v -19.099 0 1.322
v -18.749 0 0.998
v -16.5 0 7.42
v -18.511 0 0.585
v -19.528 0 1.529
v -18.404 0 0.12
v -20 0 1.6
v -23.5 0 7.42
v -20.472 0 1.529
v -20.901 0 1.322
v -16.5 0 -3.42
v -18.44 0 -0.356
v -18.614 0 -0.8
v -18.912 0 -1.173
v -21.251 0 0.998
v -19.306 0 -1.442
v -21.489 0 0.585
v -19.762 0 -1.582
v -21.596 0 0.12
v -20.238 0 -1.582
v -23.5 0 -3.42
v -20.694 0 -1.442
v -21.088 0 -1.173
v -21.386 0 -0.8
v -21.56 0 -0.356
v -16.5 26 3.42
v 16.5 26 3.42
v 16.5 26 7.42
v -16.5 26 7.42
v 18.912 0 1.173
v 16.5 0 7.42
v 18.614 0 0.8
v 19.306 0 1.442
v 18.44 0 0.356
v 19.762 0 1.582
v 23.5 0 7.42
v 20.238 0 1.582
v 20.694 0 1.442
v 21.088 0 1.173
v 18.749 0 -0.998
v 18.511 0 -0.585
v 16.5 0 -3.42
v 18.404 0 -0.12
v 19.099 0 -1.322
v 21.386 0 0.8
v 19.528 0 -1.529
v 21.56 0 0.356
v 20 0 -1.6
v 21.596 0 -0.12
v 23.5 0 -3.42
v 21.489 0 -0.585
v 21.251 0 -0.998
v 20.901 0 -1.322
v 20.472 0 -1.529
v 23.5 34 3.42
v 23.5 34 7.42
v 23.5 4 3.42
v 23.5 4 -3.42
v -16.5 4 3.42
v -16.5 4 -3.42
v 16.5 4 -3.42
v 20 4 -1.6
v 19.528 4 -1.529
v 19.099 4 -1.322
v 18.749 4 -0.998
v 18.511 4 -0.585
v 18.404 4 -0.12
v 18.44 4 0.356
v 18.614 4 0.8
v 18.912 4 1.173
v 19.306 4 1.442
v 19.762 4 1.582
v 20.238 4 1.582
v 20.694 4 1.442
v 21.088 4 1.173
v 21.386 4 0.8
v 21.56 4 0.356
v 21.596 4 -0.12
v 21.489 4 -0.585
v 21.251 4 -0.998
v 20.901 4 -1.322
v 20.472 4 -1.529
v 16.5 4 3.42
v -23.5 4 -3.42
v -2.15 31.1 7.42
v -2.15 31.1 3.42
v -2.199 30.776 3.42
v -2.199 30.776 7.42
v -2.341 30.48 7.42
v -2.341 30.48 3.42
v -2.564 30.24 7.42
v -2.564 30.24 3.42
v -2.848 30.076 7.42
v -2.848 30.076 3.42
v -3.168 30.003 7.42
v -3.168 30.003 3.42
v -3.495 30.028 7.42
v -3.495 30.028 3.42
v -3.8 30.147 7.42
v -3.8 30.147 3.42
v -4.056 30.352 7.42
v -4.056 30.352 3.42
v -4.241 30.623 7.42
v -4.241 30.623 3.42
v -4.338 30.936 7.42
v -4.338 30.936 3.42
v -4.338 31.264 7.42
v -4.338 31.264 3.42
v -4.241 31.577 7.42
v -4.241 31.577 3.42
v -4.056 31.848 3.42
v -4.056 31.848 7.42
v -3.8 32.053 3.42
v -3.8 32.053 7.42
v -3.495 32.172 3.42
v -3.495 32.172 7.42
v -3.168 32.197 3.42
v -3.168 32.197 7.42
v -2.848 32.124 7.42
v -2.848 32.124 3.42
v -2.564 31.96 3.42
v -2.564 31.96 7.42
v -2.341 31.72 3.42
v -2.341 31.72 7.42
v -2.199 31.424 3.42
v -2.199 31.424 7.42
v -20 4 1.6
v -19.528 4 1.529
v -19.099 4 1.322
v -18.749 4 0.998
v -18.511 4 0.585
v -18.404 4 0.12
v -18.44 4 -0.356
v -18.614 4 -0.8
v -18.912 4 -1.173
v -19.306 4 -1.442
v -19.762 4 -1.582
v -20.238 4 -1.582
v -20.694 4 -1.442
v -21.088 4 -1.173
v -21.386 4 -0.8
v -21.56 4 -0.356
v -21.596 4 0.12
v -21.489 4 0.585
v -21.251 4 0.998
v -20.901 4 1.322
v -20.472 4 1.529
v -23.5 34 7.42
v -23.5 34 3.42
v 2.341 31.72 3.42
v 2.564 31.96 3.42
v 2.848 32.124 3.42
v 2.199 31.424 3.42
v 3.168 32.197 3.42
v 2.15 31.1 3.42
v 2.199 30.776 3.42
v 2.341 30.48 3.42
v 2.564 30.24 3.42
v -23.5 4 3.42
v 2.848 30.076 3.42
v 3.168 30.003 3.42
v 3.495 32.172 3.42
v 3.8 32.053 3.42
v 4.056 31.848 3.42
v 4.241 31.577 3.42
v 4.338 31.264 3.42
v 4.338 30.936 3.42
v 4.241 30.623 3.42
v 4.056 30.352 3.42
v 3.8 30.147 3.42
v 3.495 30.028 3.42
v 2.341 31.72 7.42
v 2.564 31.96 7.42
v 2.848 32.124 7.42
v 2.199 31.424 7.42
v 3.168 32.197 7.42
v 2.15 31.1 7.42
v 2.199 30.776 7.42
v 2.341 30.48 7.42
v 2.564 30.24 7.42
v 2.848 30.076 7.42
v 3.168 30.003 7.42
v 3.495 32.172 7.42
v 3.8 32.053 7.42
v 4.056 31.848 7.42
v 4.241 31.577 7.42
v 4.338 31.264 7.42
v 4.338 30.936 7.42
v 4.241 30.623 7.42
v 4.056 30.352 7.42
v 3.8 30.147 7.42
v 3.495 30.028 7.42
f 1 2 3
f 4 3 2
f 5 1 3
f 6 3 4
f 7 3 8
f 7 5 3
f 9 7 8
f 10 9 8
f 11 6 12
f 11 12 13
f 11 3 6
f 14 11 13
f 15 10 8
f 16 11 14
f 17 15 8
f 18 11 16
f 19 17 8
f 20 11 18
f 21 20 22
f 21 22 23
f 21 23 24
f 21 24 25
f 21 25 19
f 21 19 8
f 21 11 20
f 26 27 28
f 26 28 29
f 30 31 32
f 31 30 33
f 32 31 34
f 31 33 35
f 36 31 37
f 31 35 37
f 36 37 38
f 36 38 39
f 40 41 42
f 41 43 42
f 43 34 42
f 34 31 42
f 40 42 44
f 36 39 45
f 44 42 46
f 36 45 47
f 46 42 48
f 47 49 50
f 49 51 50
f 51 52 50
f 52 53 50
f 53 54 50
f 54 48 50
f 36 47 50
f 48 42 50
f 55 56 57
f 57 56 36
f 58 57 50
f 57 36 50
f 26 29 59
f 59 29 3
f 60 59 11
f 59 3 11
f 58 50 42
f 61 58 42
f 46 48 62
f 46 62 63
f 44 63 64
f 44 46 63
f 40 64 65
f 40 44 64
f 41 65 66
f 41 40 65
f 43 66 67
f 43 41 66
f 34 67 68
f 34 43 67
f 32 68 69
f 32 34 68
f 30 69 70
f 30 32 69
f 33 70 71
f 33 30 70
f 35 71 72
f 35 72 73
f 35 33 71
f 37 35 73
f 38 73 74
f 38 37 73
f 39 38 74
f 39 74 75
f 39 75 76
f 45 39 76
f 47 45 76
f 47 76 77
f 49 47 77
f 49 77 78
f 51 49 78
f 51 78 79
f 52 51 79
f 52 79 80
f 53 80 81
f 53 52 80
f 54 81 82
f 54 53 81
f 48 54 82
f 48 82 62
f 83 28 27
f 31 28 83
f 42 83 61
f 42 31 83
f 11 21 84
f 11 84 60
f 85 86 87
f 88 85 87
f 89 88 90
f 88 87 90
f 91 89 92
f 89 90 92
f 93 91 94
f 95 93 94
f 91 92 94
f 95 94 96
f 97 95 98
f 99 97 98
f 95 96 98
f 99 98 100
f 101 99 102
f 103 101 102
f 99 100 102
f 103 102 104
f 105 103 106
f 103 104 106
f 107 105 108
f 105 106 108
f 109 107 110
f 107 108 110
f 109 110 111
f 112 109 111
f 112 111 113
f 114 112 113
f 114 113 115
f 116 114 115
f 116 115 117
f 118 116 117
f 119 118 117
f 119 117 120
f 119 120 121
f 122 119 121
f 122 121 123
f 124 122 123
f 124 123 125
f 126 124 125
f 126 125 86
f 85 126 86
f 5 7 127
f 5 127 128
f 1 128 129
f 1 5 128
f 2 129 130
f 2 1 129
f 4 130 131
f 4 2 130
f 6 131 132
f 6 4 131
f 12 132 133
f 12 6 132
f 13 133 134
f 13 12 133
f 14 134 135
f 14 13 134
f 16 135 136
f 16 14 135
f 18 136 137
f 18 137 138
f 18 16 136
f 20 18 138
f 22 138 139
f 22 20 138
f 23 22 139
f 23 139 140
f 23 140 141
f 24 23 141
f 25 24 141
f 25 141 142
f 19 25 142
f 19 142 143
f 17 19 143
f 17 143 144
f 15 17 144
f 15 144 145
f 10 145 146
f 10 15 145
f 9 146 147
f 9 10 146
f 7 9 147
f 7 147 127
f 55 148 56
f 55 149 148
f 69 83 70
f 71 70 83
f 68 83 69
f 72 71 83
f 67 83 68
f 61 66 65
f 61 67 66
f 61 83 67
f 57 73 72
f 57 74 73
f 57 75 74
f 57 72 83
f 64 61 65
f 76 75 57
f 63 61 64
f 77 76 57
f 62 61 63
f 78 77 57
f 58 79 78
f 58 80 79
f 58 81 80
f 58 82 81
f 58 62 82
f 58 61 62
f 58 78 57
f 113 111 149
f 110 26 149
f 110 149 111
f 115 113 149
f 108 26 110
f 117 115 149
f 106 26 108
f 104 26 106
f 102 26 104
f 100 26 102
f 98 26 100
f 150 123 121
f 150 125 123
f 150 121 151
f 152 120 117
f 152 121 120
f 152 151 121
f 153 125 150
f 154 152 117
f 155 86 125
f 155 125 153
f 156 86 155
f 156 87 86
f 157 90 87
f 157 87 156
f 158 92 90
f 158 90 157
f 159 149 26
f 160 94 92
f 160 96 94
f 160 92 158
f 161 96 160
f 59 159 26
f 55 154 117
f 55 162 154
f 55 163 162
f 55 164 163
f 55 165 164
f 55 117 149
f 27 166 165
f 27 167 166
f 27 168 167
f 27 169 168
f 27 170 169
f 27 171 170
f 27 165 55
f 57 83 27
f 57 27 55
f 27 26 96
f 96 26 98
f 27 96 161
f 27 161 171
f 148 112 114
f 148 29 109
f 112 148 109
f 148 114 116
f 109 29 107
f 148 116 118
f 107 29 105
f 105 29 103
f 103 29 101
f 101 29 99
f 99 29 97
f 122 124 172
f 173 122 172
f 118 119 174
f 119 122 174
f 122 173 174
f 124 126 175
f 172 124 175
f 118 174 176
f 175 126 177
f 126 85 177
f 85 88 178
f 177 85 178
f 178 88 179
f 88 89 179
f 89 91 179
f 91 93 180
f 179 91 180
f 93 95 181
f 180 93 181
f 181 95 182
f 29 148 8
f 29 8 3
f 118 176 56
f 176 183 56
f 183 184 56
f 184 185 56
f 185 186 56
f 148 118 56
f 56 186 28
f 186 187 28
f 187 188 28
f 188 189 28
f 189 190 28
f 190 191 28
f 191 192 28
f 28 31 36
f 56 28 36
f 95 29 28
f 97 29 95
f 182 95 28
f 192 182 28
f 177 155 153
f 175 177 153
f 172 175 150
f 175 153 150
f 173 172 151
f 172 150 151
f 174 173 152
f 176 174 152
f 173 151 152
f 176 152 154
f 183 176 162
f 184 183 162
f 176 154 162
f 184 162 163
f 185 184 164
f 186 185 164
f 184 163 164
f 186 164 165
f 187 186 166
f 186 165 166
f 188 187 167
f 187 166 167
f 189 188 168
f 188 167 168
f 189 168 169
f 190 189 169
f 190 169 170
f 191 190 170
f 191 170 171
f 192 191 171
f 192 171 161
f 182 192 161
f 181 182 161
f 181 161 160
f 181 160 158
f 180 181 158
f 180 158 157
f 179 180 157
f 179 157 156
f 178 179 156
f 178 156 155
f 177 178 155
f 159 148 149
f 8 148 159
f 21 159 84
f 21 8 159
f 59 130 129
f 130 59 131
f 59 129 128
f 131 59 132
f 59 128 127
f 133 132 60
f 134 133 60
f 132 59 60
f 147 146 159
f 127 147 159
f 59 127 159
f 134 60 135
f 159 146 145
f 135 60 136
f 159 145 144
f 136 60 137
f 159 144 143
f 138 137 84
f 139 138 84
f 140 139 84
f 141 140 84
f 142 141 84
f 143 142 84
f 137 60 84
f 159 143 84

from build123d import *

# Parameters (mm, degrees)
SKETCH_2_R          = 1.6
EXTRUDE_1_DEPTH     = 4
EXTRUDE_1_2_DEPTH   = 4
SKETCH_3_W          = 7
SKETCH_3_H          = 4
EXTRUDE_2_DEPTH     = 30
SKETCH_4_W          = 47
SKETCH_4_H          = 8
EXTRUDE_3_DEPTH     = 4
SKETCH_5_R          = 1.1
CUT_EXTRUDE_1_DEPTH = 42.893116752


with BuildPart() as part:
    # 草图2 → 凸台-拉伸1 (new body)
    with BuildSketch(Plane(origin=(0, 0, 0), x_dir=(1, 0, 0), z_dir=(0, 1, 0))):
        Polygon((-23.5, 3.41991342), (-16.5, 3.41991342), (-16.5, -3.41991342), (-16.5, -7.41991342), (-23.5, -7.41991342), (-23.5, -3.41991342), align=None)
        with Locations(Location((-20, 0, 0), (0, 0, 270))):
            Circle(SKETCH_2_R, mode=Mode.SUBTRACT)
    extrude(amount=EXTRUDE_1_DEPTH)



with BuildPart() as body_2:
    # 草图2 → Extrude 1 2 (new body)
    with BuildSketch(Plane(origin=(0, 0, 0), x_dir=(1, 0, 0), z_dir=(0, 1, 0))):
        Polygon((23.5, -7.41991342), (23.5, -3.41991342), (23.5, 3.41991342), (16.5, 3.41991342), (16.5, -3.41991342), (16.5, -7.41991342), align=None)
        with Locations(Location((20, 0, 0), (0, 0, 90))):
            Circle(SKETCH_2_R, mode=Mode.SUBTRACT)
    extrude(amount=EXTRUDE_1_2_DEPTH)


with BuildPart() as part_1:
    add(part.part)

    add(body_2.part)  # 凸台-拉伸2 merges body 2
    # 草图3 → 凸台-拉伸2 (add)
    with BuildSketch(Plane(origin=(0, 4, 0), x_dir=(1, 0, 0), z_dir=(0, 1, 0))):
        with Locations((-20, -5.41991342)):
            Rectangle(SKETCH_3_W, SKETCH_3_H)
        with Locations((20, -5.41991342)):
            Rectangle(SKETCH_3_W, SKETCH_3_H)
    extrude(amount=EXTRUDE_2_DEPTH)

    # 草图4 → 凸台-拉伸3 (add)
    with BuildSketch(Plane(origin=(0, 0, 3.41991342), x_dir=(-1, 0, 0), z_dir=(0, 0, -1))):
        with Locations((0, 30)):
            Rectangle(SKETCH_4_W, SKETCH_4_H)
    extrude(amount=-EXTRUDE_3_DEPTH)

    # 草图5 → 切除-拉伸1 (cut, through all)
    with BuildSketch(Plane(origin=(0, 0, 3.41991342), x_dir=(-1, 0, 0), z_dir=(0, 0, -1))):
        with Locations((-3.25, 31.1)):
            Circle(SKETCH_5_R)
        with Locations(Location((3.25, 31.1, 0), (0, 0, 180))):
            Circle(SKETCH_5_R)
    extrude(amount=-CUT_EXTRUDE_1_DEPTH, mode=Mode.SUBTRACT)


solid = part_1.part
